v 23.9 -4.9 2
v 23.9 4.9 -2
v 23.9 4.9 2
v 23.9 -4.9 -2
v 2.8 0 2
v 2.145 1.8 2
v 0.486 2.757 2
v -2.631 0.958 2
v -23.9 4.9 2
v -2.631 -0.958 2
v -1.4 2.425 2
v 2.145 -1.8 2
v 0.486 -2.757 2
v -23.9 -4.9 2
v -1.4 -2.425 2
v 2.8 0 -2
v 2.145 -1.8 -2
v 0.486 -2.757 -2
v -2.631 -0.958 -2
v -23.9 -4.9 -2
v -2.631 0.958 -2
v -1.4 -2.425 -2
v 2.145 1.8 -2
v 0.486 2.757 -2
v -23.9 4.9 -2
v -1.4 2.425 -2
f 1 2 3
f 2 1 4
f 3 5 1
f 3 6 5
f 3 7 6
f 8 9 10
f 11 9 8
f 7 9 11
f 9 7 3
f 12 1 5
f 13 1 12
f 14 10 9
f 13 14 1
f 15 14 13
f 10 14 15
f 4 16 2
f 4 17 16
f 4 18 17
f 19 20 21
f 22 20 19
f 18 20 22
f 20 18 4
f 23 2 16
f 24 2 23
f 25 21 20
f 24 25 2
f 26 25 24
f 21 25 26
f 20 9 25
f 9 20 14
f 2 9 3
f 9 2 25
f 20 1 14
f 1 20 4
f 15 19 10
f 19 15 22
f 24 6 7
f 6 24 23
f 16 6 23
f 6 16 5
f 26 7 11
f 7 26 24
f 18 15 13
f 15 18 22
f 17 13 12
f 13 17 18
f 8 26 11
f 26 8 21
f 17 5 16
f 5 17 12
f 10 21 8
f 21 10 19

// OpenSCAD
playseat_stand_breite      = 55;
playseat_stand_wandstaerke = 2.6;

threaded_insert_d3         = 5.6;
threaded_insert_w          = 2.1;
threaded_insert_l          = 4.0;

difference() {
    cube([
            playseat_stand_breite - playseat_stand_wandstaerke * 2 - 2,
            threaded_insert_d3 + threaded_insert_w * 2,
            threaded_insert_l
        ],
        center = true
    );

    cylinder(
        d = threaded_insert_d3,
        h = threaded_insert_l + 1.1,
        center = true
    );
}
